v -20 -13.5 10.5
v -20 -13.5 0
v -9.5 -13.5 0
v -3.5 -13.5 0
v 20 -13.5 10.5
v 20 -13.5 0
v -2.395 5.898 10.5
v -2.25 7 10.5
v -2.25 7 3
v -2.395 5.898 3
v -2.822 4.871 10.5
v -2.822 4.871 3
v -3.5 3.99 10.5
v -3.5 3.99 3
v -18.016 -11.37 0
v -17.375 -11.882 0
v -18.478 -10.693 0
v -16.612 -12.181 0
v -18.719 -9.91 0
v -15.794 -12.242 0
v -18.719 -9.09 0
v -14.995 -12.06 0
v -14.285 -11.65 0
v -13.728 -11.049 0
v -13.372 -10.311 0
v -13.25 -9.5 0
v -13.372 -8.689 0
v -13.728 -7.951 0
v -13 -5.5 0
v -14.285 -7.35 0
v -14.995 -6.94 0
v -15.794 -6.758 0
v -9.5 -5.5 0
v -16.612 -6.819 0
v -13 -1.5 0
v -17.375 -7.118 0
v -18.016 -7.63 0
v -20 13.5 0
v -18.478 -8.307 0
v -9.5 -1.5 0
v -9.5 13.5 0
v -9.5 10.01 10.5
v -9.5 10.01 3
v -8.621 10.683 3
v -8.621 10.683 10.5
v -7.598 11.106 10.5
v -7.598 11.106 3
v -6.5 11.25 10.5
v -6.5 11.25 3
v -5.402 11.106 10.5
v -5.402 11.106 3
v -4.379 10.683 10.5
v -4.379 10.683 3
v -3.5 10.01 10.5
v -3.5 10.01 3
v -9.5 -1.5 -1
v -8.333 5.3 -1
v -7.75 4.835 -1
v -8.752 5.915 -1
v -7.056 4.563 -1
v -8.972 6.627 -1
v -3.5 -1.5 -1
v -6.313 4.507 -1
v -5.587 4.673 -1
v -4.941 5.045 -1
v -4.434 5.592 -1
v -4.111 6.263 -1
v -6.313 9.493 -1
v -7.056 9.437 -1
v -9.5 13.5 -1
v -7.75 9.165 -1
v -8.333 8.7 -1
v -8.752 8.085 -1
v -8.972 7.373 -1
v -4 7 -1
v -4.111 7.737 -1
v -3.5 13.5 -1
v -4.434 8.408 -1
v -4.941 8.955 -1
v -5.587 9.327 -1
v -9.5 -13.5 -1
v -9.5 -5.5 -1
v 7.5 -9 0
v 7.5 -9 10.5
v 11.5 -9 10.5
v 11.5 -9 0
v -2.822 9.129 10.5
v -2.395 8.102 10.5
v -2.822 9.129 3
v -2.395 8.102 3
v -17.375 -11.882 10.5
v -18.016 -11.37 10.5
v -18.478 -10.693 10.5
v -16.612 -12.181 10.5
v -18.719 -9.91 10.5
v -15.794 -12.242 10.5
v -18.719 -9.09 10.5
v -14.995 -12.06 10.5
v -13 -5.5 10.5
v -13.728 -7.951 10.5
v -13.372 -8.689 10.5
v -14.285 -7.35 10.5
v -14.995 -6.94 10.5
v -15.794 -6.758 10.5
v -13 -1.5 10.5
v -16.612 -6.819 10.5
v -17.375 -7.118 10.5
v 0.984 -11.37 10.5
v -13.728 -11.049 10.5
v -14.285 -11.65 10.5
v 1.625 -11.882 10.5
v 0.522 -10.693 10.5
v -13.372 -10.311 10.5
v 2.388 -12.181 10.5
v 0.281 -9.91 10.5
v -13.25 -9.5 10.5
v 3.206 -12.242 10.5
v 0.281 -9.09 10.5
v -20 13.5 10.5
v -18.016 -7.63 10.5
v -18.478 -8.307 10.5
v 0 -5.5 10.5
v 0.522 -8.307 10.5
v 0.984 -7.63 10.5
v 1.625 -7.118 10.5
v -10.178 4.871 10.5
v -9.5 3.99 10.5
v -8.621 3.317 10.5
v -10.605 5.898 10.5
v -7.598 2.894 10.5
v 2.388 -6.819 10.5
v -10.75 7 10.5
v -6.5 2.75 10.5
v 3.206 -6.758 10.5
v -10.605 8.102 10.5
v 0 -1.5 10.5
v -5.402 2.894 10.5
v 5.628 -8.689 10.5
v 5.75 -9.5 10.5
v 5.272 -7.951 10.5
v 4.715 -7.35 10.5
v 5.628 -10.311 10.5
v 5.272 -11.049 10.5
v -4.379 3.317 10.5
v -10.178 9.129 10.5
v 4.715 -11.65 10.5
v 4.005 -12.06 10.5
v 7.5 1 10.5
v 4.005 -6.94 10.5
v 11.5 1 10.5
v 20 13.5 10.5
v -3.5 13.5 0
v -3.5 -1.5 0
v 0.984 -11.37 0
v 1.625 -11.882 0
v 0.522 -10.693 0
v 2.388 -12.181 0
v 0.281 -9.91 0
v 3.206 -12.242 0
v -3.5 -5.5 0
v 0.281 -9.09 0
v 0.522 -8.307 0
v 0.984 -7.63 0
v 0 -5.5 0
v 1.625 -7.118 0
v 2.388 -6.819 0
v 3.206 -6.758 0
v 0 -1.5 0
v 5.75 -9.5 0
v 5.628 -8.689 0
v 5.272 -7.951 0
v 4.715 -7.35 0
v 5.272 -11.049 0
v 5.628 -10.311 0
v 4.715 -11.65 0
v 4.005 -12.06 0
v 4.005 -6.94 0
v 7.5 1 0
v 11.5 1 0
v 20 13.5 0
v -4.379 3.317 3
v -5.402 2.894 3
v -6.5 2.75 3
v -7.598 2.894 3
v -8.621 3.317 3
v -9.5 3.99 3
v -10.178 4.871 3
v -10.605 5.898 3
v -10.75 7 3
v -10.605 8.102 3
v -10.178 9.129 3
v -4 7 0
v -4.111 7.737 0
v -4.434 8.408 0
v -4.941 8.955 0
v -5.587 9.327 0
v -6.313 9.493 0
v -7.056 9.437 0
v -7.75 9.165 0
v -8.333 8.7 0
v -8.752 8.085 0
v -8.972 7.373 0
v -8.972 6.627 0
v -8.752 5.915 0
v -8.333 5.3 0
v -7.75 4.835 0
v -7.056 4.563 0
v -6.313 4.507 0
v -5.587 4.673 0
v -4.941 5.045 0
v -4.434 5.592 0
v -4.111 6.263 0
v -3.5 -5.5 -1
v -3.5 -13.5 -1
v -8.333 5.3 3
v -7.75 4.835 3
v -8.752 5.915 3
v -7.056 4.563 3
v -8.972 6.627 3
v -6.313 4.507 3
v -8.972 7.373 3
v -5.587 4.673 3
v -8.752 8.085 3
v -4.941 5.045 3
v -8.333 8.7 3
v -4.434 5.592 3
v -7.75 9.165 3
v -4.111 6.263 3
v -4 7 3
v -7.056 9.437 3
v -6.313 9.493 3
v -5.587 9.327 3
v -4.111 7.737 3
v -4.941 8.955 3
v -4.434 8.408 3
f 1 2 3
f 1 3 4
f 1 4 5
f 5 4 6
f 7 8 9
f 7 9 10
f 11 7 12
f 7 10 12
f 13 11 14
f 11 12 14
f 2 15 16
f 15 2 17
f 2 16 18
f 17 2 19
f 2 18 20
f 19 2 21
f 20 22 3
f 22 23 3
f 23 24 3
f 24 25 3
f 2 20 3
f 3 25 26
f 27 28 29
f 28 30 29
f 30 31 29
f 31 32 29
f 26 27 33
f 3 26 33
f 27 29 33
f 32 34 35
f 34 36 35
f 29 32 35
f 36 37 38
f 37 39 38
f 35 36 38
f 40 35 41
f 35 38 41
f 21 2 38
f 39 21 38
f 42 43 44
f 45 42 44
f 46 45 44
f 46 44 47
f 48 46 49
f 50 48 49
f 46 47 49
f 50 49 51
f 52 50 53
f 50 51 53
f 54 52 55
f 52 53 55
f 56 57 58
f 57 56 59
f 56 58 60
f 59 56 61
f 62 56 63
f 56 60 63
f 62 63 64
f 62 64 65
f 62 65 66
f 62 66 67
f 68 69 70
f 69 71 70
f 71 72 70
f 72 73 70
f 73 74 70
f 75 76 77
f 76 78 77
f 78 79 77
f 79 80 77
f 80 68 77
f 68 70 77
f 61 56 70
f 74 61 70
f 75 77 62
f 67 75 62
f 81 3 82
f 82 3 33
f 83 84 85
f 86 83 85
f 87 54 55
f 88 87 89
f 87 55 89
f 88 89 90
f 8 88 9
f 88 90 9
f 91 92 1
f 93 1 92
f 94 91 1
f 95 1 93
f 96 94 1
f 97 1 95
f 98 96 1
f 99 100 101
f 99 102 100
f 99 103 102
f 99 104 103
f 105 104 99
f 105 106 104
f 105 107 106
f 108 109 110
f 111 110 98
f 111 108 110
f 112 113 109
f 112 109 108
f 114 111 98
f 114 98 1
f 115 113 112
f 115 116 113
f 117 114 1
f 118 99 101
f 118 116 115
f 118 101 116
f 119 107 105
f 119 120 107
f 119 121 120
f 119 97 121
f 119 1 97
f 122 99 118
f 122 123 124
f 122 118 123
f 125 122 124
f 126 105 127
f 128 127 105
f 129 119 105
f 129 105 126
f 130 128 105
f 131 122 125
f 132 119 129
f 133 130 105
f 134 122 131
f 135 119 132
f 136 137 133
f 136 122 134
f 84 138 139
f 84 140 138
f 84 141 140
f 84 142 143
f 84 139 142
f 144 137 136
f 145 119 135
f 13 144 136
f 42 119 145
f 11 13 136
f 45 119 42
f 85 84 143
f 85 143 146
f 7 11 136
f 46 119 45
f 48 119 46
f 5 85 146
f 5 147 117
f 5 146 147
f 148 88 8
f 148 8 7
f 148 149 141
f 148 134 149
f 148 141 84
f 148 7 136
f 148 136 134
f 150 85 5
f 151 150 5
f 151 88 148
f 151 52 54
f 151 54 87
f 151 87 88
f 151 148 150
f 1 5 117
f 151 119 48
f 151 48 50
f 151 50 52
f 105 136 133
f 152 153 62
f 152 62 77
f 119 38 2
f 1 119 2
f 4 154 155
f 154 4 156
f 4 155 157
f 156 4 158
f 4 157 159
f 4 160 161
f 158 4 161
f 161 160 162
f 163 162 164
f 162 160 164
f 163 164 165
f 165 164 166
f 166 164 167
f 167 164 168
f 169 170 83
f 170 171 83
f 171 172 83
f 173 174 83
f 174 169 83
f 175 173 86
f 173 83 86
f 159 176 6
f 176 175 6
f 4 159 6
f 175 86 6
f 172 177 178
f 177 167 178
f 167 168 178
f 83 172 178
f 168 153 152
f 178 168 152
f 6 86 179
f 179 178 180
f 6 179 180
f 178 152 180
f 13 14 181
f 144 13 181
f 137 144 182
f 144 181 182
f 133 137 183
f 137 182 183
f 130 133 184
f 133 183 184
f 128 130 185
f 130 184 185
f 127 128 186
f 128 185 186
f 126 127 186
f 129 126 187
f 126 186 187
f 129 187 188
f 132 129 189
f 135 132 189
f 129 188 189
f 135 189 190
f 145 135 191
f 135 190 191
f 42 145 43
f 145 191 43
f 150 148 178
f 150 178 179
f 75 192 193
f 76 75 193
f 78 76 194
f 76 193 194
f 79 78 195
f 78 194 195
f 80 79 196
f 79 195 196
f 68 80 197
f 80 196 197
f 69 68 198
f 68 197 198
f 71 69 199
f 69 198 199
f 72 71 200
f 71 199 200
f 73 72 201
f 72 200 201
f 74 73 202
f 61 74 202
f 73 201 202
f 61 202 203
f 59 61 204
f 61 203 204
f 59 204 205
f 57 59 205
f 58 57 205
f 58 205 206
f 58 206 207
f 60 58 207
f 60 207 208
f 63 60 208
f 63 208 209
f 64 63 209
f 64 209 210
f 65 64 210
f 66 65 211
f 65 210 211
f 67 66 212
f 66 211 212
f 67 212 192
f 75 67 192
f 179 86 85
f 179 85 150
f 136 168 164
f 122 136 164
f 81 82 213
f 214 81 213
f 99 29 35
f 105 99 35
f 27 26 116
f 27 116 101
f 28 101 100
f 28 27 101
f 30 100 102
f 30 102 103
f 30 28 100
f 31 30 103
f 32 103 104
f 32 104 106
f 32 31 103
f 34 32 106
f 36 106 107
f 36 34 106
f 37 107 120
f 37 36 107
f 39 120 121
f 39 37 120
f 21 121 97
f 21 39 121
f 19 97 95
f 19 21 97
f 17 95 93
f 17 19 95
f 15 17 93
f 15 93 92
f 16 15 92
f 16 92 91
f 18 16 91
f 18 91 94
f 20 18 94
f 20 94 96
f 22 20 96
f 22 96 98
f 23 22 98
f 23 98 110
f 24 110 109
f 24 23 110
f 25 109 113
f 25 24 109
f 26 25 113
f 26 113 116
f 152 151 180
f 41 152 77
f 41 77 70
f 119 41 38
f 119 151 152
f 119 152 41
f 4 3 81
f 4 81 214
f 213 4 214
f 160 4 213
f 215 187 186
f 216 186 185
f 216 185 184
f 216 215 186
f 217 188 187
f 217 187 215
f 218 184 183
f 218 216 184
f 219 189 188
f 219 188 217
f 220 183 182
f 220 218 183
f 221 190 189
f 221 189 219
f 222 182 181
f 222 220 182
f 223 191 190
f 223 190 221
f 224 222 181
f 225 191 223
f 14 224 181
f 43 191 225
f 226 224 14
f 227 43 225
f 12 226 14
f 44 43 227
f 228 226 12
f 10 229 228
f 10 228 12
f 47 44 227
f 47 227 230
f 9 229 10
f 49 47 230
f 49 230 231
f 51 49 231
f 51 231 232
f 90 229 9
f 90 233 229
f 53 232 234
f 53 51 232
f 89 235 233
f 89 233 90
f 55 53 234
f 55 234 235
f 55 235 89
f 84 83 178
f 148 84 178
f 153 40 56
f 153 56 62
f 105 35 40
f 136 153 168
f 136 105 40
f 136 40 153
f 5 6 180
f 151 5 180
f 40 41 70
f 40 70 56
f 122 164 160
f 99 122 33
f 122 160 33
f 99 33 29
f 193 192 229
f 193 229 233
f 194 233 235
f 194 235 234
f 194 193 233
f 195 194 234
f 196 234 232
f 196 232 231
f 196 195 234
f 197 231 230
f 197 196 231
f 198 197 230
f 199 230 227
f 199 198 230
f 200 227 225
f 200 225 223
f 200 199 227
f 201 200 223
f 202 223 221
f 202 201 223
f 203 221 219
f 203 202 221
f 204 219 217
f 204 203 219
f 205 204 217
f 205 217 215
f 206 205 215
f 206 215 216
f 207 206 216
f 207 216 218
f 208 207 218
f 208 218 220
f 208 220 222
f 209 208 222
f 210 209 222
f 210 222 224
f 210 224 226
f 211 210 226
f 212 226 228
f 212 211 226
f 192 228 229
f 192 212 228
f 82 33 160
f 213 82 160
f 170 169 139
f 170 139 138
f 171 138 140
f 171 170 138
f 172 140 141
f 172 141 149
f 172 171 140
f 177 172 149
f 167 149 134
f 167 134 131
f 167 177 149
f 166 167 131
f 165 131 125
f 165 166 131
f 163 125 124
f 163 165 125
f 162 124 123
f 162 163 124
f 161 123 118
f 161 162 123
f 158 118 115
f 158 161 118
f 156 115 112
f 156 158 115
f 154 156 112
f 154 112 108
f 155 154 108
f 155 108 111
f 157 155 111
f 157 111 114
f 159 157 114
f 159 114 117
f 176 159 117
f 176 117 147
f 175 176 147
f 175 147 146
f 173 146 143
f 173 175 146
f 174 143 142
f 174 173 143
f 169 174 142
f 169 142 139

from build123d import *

# Parameters (mm, degrees)
F0_R     = 2.75
F0_W     = 4
F0_H     = 10
F0_W_2   = 6
F0_H_2   = 8
F1_DEPTH = 10.5
F0_R_2   = 2.5
F2_DEPTH = 3
F3_DEPTH = 1


with BuildPart() as f1:
    # F0 (on Top) → F1 (new body)
    with BuildSketch(Plane.XY):
        with BuildLine():
            Line((-20, -13.5), (-9.5, -13.5))
            Line((-9.5, -13.5), (-9.5, -5.5))
            Line((-9.5, -5.5), (-13, -5.5))
            Line((-13, -5.5), (-13, -1.5))
            Line((-13, -1.5), (-9.5, -1.5))
            Line((-9.5, -1.5), (-9.5, 3.9896013553))
            ThreePointArc((-9.5, 3.9896013553), (-10.75, 7), (-9.5, 10.0103986447))
            Line((-9.5, 10.0103986447), (-9.5, 13.5))
            Line((-9.5, 13.5), (-20, 13.5))
            Line((-20, 13.5), (-20, -13.5))
        make_face()
        with Locations((-16, -9.5)):
            Circle(F0_R, mode=Mode.SUBTRACT)
        with BuildLine():
            Line((-3.5, 10.0103986447), (-3.5, 13.5))
            Line((-3.5, 13.5), (-9.5, 13.5))
            Line((-9.5, 13.5), (-9.5, 10.0103986447))
            ThreePointArc((-9.5, 10.0103986447), (-6.5, 11.25), (-3.5, 10.0103986447))
        make_face()
        with BuildLine():
            Line((-3.5, -13.5), (20, -13.5))
            Line((20, -13.5), (20, 13.5))
            Line((20, 13.5), (-3.5, 13.5))
            Line((-3.5, 13.5), (-3.5, 10.0103986447))
            ThreePointArc((-3.5, 10.0103986447), (-2.574920383, 8.6298006013), (-2.25, 7))
            ThreePointArc((-2.25, 7), (-2.574920383, 5.3701993987), (-3.5, 3.9896013553))
            Line((-3.5, 3.9896013553), (-3.5, -1.5))
            Line((-3.5, -1.5), (0, -1.5))
            Line((0, -1.5), (0, -5.5))
            Line((0, -5.5), (-3.5, -5.5))
            Line((-3.5, -5.5), (-3.5, -13.5))
        make_face()
        with Locations((3, -9.5)):
            Circle(F0_R, mode=Mode.SUBTRACT)
        with Locations((9.5, -4)):
            Rectangle(F0_W, F0_H, mode=Mode.SUBTRACT)
        with Locations((-6.5, -9.5)):
            Rectangle(F0_W_2, F0_H_2)
        with BuildLine():
            Line((-9.5, -1.5), (-3.5, -1.5))
            Line((-3.5, -1.5), (-3.5, 3.9896013553))
            ThreePointArc((-3.5, 3.9896013553), (-6.5, 2.75), (-9.5, 3.9896013553))
            Line((-9.5, 3.9896013553), (-9.5, -1.5))
        make_face()
    extrude(amount=F1_DEPTH)

    # F0 (on Top) → F2 (join)
    with BuildSketch(Plane.XY):
        with BuildLine():
            Line((-9.5, 3.9896013553), (-9.5, 10.0103986447))
            ThreePointArc((-9.5, 10.0103986447), (-10.75, 7), (-9.5, 3.9896013553))
        make_face()
        with BuildLine():
            Line((-3.5, 3.9896013553), (-3.5, 10.0103986447))
            ThreePointArc((-3.5, 10.0103986447), (-6.5, 11.25), (-9.5, 10.0103986447))
            Line((-9.5, 10.0103986447), (-9.5, 3.9896013553))
            ThreePointArc((-9.5, 3.9896013553), (-6.5, 2.75), (-3.5, 3.9896013553))
        make_face()
        with Locations((-6.5, 7)):
            Circle(F0_R_2, mode=Mode.SUBTRACT)
        with BuildLine():
            ThreePointArc((-2.25, 7), (-2.574920383, 8.6298006013), (-3.5, 10.0103986447))
            Line((-3.5, 10.0103986447), (-3.5, 3.9896013553))
            ThreePointArc((-3.5, 3.9896013553), (-2.574920383, 5.3701993987), (-2.25, 7))
        make_face()
    extrude(amount=F2_DEPTH)

    # F0 (on Top) → F3 (join)
    with BuildSketch(Plane.XY):
        with BuildLine():
            Line((-3.5, 10.0103986447), (-3.5, 13.5))
            Line((-3.5, 13.5), (-9.5, 13.5))
            Line((-9.5, 13.5), (-9.5, 10.0103986447))
            ThreePointArc((-9.5, 10.0103986447), (-6.5, 11.25), (-3.5, 10.0103986447))
        make_face()
        with BuildLine():
            Line((-3.5, 3.9896013553), (-3.5, 10.0103986447))
            ThreePointArc((-3.5, 10.0103986447), (-6.5, 11.25), (-9.5, 10.0103986447))
            Line((-9.5, 10.0103986447), (-9.5, 3.9896013553))
            ThreePointArc((-9.5, 3.9896013553), (-6.5, 2.75), (-3.5, 3.9896013553))
        make_face()
        with Locations((-6.5, 7)):
            Circle(F0_R_2, mode=Mode.SUBTRACT)
        with BuildLine():
            Line((-9.5, -1.5), (-3.5, -1.5))
            Line((-3.5, -1.5), (-3.5, 3.9896013553))
            ThreePointArc((-3.5, 3.9896013553), (-6.5, 2.75), (-9.5, 3.9896013553))
            Line((-9.5, 3.9896013553), (-9.5, -1.5))
        make_face()
        with Locations((-6.5, -9.5)):
            Rectangle(F0_W_2, F0_H_2)
    extrude(amount=-F3_DEPTH)


solid = f1.part
